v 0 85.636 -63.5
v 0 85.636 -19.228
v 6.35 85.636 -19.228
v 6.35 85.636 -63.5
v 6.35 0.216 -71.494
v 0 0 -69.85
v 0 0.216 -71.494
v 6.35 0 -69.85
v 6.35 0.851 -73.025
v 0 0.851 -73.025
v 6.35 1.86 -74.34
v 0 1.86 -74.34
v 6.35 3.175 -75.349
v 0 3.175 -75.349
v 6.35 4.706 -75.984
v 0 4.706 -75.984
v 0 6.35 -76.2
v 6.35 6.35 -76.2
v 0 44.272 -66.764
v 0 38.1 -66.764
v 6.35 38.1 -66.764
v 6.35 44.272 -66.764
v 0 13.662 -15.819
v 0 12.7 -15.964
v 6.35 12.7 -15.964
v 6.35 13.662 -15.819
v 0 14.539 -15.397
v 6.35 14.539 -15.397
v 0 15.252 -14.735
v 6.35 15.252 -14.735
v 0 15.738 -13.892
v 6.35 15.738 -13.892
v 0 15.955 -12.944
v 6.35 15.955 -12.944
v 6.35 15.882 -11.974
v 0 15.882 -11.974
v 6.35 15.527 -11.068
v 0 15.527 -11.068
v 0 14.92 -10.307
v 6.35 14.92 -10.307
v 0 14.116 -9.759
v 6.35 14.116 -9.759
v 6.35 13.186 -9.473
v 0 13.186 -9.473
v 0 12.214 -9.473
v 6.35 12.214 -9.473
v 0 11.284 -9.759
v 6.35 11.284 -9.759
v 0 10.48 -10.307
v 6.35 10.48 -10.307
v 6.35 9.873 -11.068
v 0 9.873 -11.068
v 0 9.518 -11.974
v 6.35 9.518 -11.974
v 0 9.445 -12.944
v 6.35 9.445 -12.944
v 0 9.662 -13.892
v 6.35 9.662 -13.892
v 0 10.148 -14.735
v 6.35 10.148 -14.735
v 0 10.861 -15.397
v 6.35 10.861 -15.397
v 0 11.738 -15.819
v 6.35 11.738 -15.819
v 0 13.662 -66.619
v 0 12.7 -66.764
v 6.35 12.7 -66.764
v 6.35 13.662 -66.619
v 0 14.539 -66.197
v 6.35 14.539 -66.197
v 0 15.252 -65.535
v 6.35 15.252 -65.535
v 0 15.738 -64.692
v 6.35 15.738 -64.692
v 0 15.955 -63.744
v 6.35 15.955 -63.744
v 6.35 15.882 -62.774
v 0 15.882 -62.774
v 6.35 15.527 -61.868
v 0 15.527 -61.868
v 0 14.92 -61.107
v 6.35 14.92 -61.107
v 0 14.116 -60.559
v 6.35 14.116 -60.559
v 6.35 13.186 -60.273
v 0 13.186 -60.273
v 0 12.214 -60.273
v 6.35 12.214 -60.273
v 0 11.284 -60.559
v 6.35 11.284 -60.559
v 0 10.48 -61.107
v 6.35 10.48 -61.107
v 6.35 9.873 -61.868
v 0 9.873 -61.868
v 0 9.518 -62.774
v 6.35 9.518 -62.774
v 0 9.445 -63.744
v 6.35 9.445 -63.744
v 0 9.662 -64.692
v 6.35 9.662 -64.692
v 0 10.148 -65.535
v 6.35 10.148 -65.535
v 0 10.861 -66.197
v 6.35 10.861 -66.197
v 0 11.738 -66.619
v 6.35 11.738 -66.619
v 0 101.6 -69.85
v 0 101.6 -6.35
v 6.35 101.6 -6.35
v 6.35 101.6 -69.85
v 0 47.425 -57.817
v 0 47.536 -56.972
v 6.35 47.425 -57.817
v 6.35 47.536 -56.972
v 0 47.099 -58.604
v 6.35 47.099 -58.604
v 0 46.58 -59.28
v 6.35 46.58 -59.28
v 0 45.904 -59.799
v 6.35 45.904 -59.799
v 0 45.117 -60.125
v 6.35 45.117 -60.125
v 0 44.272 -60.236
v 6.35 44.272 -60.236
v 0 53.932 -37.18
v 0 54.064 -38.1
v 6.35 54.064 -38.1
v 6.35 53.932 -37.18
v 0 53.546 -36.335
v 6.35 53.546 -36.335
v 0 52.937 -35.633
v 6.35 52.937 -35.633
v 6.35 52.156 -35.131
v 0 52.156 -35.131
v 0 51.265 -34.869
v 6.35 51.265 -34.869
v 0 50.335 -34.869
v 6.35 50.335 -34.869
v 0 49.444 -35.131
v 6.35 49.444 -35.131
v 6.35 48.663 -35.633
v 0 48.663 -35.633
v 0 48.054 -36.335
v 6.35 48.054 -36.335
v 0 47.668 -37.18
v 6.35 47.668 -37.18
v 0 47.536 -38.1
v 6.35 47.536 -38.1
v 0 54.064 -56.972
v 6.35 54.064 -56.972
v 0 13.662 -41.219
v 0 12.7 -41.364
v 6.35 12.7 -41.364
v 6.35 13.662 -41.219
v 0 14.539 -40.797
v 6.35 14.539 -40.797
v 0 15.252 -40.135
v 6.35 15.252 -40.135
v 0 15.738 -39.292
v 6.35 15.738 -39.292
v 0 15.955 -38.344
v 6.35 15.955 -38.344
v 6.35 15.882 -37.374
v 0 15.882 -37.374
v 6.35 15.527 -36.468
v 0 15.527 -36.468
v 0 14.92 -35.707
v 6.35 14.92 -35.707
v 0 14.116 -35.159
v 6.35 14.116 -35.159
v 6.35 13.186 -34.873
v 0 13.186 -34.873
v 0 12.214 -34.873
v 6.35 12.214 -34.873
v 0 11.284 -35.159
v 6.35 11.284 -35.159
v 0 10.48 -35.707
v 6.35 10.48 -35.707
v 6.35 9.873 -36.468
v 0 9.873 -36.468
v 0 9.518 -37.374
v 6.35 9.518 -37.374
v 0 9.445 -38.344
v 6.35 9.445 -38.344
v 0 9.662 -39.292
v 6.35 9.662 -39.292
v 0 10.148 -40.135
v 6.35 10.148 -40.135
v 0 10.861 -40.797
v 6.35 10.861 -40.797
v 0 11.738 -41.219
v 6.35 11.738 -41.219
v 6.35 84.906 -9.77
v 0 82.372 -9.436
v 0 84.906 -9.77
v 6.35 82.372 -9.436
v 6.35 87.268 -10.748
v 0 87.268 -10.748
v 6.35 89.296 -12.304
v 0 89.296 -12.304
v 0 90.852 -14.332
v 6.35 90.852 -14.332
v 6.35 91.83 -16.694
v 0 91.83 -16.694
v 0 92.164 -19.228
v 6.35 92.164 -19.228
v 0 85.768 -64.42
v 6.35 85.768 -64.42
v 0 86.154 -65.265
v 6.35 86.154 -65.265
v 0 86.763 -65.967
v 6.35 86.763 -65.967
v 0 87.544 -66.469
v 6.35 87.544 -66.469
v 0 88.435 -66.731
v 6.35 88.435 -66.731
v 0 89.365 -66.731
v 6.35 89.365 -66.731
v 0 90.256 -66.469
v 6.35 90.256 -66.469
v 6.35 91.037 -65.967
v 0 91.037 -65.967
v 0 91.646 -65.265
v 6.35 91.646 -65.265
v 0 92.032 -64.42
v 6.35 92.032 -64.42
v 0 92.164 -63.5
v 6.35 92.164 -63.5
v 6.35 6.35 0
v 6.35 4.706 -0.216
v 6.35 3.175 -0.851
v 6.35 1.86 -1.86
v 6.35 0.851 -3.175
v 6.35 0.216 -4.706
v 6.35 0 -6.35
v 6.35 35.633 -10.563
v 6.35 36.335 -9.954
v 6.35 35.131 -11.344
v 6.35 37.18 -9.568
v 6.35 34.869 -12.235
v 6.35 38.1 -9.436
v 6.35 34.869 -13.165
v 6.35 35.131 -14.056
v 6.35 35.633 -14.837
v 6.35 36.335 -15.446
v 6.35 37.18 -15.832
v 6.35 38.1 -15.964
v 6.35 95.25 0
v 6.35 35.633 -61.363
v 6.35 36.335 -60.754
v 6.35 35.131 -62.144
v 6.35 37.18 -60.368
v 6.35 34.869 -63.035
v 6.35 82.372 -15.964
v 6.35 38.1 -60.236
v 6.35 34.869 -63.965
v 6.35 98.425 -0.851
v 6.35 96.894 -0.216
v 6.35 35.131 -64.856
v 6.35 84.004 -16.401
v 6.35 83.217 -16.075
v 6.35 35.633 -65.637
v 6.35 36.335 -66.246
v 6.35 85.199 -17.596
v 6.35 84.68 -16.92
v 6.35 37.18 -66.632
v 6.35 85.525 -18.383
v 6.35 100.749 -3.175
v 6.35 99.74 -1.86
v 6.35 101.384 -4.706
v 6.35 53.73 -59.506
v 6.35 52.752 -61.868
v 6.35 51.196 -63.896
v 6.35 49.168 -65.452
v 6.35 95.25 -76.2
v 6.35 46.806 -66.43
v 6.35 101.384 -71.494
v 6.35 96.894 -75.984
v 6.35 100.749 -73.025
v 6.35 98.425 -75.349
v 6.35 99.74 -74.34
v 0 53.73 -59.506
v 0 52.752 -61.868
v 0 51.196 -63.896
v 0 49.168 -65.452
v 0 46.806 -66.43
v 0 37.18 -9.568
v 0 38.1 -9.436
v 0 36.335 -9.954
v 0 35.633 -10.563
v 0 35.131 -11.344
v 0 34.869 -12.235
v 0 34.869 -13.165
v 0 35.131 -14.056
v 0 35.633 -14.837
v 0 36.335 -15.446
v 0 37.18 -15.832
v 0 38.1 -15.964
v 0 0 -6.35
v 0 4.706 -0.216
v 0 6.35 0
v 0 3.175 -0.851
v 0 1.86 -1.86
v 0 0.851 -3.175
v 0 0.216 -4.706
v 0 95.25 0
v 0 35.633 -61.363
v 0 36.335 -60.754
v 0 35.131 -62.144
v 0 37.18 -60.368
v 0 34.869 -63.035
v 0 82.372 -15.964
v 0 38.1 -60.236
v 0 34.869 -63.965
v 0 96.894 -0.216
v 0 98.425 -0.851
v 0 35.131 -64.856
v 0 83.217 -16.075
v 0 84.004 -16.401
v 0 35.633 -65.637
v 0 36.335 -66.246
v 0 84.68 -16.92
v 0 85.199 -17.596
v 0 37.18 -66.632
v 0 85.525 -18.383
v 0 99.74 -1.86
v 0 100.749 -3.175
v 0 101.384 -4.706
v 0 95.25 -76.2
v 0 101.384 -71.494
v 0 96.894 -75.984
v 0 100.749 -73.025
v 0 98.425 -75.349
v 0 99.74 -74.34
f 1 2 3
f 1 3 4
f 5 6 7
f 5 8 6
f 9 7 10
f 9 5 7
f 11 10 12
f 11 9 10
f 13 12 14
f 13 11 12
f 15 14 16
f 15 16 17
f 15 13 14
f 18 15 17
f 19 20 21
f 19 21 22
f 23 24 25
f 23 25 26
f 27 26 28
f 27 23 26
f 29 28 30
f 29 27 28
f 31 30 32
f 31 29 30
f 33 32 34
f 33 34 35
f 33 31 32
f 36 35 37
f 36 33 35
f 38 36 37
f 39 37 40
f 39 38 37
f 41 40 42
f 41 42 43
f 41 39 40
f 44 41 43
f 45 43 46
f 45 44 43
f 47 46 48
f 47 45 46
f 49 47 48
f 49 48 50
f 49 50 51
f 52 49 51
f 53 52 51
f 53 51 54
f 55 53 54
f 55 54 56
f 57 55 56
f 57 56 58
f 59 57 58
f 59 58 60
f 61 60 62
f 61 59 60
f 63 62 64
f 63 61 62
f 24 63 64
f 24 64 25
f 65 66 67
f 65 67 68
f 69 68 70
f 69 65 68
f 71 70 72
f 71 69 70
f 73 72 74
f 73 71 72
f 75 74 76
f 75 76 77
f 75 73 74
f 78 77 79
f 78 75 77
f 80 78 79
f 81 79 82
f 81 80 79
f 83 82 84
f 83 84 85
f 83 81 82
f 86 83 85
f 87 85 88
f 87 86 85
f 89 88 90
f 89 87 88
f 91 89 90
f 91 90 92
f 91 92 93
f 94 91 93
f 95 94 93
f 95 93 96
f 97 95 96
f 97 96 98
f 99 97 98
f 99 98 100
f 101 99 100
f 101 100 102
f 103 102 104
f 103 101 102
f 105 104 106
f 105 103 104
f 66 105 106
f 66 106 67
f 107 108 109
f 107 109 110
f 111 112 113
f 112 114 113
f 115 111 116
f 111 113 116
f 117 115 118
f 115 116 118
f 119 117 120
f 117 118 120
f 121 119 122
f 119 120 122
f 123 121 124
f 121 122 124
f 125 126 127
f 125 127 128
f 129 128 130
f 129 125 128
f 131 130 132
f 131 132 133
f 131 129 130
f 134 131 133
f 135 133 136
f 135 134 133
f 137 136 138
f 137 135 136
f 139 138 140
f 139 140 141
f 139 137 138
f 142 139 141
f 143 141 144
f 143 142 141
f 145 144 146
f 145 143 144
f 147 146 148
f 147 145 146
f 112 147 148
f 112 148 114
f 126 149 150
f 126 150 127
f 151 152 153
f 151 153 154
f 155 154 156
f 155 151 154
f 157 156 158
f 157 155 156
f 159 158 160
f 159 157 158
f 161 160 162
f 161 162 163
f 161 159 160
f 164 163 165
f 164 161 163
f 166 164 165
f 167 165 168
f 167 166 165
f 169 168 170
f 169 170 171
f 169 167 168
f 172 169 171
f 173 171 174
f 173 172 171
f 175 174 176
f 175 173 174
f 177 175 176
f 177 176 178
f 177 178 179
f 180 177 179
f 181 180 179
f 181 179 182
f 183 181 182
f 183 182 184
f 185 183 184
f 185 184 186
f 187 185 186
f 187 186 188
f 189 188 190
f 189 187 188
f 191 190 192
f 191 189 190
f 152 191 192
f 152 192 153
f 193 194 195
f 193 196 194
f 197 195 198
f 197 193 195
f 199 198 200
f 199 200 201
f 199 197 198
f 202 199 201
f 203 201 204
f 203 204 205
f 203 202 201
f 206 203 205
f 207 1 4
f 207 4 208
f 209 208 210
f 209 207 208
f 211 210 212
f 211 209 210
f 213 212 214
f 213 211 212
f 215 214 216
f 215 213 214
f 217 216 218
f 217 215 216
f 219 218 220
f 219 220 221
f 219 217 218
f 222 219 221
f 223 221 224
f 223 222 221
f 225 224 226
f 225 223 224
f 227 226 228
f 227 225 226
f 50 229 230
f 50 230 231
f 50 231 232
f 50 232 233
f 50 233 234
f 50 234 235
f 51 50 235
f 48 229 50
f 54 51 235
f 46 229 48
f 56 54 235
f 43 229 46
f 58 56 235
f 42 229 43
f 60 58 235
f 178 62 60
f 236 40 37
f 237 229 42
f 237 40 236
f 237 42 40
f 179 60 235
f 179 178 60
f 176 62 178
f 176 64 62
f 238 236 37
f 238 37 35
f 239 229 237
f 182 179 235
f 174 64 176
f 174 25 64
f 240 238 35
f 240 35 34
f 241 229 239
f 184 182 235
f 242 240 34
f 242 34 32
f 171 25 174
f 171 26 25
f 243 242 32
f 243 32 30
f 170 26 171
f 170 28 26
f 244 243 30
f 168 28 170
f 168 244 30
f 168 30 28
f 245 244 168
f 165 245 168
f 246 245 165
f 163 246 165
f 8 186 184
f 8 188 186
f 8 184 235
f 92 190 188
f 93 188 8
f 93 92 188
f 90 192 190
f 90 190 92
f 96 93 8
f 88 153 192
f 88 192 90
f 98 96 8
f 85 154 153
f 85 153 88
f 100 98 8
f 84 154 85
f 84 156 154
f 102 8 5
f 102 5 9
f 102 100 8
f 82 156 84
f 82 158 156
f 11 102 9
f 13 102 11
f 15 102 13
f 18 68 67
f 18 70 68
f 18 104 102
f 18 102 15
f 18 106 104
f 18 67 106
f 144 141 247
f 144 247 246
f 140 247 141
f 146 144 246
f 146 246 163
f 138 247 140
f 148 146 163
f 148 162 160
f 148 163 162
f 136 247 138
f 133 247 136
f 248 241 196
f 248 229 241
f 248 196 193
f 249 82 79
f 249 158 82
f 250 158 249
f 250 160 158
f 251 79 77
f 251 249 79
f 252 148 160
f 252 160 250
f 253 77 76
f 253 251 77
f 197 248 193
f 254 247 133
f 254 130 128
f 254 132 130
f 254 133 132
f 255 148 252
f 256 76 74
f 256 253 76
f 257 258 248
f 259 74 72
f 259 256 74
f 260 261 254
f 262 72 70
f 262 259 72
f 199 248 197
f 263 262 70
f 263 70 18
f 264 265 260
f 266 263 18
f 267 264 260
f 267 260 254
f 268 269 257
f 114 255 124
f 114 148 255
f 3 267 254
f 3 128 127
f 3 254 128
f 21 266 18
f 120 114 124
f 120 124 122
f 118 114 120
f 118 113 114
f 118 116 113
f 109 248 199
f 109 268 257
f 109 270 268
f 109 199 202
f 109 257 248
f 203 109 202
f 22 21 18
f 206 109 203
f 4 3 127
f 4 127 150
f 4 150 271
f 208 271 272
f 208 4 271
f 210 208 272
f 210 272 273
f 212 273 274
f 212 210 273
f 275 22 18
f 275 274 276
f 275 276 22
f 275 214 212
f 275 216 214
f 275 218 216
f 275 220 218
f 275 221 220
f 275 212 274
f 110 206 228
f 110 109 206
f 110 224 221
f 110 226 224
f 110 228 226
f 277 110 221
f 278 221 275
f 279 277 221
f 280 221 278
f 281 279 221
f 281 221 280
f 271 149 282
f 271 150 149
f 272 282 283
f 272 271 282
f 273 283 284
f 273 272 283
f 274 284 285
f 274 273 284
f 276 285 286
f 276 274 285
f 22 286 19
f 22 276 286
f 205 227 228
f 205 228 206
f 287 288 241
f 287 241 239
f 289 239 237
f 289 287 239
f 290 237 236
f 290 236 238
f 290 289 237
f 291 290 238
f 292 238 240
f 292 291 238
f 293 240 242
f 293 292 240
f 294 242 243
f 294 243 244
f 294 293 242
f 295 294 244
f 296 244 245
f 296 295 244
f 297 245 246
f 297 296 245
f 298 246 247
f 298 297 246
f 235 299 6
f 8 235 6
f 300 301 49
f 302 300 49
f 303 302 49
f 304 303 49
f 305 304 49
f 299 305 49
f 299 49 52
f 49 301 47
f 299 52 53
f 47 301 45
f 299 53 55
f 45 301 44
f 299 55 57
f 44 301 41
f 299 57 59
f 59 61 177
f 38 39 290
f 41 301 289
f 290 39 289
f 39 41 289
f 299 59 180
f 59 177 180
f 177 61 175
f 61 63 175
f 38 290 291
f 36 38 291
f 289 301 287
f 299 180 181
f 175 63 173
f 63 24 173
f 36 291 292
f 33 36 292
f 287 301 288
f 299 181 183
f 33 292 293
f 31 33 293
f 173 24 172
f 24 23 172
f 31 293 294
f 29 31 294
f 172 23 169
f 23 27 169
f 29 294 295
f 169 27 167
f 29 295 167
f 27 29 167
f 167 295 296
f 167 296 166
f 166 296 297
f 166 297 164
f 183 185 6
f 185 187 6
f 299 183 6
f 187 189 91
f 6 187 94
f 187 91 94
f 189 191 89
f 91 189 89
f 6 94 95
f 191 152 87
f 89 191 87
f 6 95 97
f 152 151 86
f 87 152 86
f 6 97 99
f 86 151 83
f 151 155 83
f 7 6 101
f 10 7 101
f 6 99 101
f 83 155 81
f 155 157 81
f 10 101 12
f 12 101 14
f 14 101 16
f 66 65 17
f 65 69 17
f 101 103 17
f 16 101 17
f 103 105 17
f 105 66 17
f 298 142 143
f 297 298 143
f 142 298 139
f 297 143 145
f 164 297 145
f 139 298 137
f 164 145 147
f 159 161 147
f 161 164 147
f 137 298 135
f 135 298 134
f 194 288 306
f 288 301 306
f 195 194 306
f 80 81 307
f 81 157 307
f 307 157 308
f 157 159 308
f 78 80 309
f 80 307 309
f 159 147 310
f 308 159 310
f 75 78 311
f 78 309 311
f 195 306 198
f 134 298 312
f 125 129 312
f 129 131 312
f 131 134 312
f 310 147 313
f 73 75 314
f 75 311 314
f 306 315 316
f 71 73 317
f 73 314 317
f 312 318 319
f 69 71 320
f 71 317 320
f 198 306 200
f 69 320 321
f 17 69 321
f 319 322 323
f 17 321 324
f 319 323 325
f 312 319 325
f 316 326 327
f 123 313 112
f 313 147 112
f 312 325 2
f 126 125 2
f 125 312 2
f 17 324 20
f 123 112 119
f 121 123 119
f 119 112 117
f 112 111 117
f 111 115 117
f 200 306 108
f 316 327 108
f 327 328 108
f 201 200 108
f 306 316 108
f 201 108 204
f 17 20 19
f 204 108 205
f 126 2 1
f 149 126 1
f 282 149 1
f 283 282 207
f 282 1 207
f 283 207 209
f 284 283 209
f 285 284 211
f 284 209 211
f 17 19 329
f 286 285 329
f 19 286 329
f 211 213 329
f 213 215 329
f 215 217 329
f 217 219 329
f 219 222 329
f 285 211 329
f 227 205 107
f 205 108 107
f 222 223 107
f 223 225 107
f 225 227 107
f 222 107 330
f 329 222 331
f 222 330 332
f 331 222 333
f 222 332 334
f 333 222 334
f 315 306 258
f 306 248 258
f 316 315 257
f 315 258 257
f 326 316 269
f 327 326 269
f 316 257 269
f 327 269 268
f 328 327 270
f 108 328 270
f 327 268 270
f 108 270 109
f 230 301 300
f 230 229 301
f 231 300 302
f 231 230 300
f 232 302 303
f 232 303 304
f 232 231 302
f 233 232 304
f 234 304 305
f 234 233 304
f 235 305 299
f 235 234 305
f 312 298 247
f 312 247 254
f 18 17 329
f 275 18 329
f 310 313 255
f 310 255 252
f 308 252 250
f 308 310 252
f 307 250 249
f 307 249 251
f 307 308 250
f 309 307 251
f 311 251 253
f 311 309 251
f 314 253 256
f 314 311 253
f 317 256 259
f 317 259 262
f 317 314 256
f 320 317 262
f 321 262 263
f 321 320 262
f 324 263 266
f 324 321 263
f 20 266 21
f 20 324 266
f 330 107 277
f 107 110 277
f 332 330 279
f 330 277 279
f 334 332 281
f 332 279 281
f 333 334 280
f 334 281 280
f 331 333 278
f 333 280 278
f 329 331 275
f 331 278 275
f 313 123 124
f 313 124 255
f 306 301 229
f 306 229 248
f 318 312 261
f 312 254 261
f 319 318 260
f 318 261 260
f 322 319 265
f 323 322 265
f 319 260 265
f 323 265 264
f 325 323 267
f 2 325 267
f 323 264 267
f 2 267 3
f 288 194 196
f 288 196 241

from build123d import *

# Parameters (mm, degrees)
SKETCH1_W      = 76.2
SKETCH1_H      = 101.6
SKETCH1_R      = 3.2639
EXTRUDE1_DEPTH = 6.35
FILLET2_R      = 3.2639
FILLET3_R      = 9.7917
FILLET4_R      = 6.35


with BuildPart() as part:
    # Sketch1 → Extrude1 (new body)
    with BuildSketch(Plane(origin=(0, 0, 0), x_dir=(0, 0, -1), z_dir=(1, 0, 0))):
        with Locations((38.1, 50.8)):
            Rectangle(SKETCH1_W, SKETCH1_H)
        with Locations((12.7, 12.7)):
            Circle(SKETCH1_R, mode=Mode.SUBTRACT)
        with Locations((38.1, 12.7)):
            Circle(SKETCH1_R, mode=Mode.SUBTRACT)
        with Locations((63.5, 12.7)):
            Circle(SKETCH1_R, mode=Mode.SUBTRACT)
        with BuildLine():
            Line((38.1, 47.5361), (60.2361, 47.5361))
            Line((60.2361, 47.5361), (60.2361, 38.1))
            ThreePointArc((60.2361, 38.1), (63.5, 34.8361), (66.7639, 38.1))
            Line((66.7639, 38.1), (66.7639, 54.0639))
            Line((66.7639, 54.0639), (38.1, 54.0639))
            ThreePointArc((38.1, 54.0639), (34.8361, 50.8), (38.1, 47.5361))
        make_face(mode=Mode.SUBTRACT)
        with BuildLine():
            Line((15.9639, 38.1), (15.9639, 85.6361))
            Line((15.9639, 85.6361), (63.5, 85.6361))
            ThreePointArc((63.5, 85.6361), (66.7639, 88.9), (63.5, 92.1639))
            Line((63.5, 92.1639), (9.4361, 92.1639))
            Line((9.4361, 92.1639), (9.4361, 38.1))
            ThreePointArc((9.4361, 38.1), (12.7, 34.8361), (15.9639, 38.1))
        make_face(mode=Mode.SUBTRACT)
    extrude(amount=EXTRUDE1_DEPTH)

    # Fillet2
    fillet2_edges = [part.edges().sort_by_distance(p)[0] for p in [
        (3.175, 47.5361, -60.2361),
        (3.175, 85.6361, -15.9639),
    ]]
    fillet(fillet2_edges, radius=FILLET2_R)

    # Fillet3
    fillet3_edges = [part.edges().sort_by_distance(p)[0] for p in [
        (3.175, 54.0639, -66.7639),
        (3.175, 92.1639, -9.4361),
    ]]
    fillet(fillet3_edges, radius=FILLET3_R)

    # Fillet4
    fillet4_edges = [part.edges().sort_by_distance(p)[0] for p in [
        (3.175, 101.6, 0),
        (3.175, 101.6, -76.2),
        (3.175, 0, -76.2),
        (3.175, 0, 0),
    ]]
    fillet(fillet4_edges, radius=FILLET4_R)


solid = part.part
